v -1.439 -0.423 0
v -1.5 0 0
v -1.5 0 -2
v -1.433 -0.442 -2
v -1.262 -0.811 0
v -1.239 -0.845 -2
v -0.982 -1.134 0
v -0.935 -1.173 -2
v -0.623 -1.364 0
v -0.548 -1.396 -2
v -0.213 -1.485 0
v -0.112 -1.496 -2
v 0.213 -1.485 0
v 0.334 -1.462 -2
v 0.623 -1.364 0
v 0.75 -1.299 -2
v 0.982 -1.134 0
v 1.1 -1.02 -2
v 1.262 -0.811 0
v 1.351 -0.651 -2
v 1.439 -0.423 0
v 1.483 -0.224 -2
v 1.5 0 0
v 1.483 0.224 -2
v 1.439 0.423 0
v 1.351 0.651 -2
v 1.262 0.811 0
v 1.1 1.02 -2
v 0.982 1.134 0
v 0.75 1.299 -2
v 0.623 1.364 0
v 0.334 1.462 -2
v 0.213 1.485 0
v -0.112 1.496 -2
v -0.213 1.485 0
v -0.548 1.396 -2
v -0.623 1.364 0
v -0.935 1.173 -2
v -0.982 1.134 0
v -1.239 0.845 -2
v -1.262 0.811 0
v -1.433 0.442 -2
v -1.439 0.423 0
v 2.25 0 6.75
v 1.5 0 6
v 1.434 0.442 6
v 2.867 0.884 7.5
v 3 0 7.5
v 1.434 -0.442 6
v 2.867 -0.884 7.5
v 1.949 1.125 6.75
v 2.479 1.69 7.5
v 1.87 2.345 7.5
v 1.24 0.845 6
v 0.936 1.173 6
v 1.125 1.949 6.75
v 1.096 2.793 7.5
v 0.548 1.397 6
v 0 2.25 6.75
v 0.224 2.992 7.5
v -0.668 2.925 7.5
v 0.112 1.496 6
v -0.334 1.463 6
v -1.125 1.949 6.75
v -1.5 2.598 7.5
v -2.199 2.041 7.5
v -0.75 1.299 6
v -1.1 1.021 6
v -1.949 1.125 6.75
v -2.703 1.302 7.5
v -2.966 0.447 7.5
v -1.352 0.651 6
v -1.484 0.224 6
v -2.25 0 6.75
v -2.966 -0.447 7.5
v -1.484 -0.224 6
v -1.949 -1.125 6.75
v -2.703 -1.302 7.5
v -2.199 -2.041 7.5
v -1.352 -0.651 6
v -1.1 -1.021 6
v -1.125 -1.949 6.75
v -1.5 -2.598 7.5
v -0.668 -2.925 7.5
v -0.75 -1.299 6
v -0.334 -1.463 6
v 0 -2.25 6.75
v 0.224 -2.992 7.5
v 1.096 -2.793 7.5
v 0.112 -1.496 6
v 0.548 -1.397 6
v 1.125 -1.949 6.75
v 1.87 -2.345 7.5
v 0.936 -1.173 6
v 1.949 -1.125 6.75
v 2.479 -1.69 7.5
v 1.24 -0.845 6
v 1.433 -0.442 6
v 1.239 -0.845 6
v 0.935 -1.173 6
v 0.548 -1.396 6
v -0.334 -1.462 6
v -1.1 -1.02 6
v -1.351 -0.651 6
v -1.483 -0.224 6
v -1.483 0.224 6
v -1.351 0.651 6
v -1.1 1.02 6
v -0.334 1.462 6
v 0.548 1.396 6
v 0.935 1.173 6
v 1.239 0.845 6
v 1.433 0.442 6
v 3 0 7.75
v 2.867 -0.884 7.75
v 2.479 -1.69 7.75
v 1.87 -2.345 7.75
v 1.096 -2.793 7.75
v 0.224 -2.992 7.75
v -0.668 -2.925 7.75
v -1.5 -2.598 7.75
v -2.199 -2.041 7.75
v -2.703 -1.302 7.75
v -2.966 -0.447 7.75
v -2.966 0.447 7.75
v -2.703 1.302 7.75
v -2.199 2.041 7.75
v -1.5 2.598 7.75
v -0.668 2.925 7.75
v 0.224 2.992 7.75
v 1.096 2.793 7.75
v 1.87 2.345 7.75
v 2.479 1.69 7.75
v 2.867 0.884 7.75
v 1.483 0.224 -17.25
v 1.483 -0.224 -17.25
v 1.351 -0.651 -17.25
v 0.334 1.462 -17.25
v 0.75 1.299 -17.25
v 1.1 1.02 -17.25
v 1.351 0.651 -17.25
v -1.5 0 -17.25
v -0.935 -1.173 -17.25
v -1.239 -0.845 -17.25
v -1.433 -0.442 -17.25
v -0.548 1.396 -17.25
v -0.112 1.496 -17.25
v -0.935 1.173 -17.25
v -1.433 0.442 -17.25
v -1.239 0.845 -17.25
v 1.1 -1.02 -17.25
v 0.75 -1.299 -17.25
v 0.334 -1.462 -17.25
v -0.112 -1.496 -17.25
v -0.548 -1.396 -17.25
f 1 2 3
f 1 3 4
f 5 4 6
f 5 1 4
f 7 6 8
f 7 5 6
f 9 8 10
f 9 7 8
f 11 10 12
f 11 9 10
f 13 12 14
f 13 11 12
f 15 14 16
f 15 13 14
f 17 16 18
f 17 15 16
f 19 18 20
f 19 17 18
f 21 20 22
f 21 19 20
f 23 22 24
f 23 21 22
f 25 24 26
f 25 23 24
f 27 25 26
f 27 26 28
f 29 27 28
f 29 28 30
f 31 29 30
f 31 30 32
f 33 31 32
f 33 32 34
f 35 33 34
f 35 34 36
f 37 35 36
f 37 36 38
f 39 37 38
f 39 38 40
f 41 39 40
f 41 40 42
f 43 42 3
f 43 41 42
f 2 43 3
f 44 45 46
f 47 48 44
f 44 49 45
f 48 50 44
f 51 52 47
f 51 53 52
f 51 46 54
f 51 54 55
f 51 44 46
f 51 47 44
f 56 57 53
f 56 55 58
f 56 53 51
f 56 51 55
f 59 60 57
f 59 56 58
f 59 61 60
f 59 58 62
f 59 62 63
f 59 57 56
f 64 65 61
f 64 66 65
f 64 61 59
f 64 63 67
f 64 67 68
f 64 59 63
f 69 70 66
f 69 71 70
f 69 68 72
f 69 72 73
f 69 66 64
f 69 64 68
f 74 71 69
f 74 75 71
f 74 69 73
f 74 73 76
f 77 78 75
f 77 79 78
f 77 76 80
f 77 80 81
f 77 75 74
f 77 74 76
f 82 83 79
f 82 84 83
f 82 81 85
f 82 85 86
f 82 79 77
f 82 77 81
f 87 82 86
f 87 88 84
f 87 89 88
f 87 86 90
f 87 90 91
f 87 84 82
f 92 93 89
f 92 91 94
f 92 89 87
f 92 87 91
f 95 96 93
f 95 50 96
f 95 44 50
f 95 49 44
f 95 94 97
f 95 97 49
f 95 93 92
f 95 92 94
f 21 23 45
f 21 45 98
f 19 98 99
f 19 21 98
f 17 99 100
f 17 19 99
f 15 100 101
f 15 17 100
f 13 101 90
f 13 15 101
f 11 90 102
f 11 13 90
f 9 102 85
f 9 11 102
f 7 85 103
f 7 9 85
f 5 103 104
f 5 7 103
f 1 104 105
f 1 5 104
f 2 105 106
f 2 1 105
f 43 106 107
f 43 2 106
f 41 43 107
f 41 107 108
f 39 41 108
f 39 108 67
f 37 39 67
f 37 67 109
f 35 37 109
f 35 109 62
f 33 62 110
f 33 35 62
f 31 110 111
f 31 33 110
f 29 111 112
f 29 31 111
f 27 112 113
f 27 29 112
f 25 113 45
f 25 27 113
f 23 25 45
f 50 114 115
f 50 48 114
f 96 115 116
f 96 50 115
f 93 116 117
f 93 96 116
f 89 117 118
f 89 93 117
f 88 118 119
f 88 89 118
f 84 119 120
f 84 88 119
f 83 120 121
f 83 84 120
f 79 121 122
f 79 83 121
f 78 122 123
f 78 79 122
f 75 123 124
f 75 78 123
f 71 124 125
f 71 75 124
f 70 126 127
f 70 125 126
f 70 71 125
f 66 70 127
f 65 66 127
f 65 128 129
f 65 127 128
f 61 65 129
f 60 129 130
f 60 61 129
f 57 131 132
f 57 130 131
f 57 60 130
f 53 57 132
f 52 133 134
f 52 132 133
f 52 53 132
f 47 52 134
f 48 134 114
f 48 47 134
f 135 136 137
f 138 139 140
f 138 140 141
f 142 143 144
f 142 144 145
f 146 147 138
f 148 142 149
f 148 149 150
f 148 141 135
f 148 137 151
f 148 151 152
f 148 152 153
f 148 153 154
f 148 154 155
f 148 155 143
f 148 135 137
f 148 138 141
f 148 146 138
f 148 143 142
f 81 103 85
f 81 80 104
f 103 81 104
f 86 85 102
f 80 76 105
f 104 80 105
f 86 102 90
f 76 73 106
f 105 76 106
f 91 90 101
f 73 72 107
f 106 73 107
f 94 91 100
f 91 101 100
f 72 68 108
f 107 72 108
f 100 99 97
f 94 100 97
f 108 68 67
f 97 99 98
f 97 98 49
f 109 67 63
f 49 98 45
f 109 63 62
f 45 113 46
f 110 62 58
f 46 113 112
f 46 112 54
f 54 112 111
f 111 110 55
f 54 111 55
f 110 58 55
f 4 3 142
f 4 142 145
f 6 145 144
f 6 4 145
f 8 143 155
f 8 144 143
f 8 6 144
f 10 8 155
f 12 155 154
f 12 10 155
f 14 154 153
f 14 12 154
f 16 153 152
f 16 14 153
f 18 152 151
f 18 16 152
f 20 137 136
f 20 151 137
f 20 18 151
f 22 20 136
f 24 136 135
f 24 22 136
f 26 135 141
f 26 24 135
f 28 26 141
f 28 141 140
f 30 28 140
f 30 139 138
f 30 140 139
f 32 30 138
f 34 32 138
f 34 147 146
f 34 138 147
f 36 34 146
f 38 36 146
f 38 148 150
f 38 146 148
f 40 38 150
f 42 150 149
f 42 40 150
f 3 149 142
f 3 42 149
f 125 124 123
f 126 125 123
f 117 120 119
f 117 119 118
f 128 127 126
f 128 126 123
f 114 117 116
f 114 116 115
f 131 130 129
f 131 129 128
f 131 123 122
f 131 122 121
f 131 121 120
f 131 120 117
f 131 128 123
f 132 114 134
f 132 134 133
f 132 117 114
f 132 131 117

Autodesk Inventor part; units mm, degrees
ref_plane "YZ Plane" through (0, 0, 0) normal (1, 0, 0) x (0, 1, 0)
ref_plane "XZ Plane" through (0, 0, 0) normal (0, 1, 0) x (-1, 0, 0)
ref_plane "XY Plane" through (0, 0, 0) normal (0, 0, 1) x (1, 0, 0)
sketch "スケッチ1" plane through (0, 0, 0) normal (0, 0, 1) x (1, 0, 0)
  circle A0 centre (0, 0) radius 1.5
  dimension "d0" = 3
extrude "押し出し1" add sketch "スケッチ1" along normal blind 6
sketch "スケッチ2" plane through (0, 0, 6) normal (0, 0, 1) x (1, 0, 0)
  circle A0 centre (0, 0) radius 1.5 projected
  circle A1 centre (0, 0) radius 3
  dimension "d3" = 6
extrude "押し出し2" add sketch "スケッチ2" along normal blind 1.75 contours A0 | A1
thread "ねじ1" size "M3x0.5" class "6g" standard "ANSI Metric M Profile" full length
chamfer "面取り1" distance 1.5 angle 45 1 edges at (-3, 0, 6)
sketch "スケッチ4" plane through (0, 0, 0) normal (0, 0, -1) x (-1, 0, 0)
  circle A0 centre (0, 0) radius 1.5 projected
extrude "押し出し4" add sketch "スケッチ4" along normal blind 4
sketch "スケッチ5" plane through (0, 0, -4) normal (0, 0, -1) x (-1, 0, 0)
  circle A0 centre (0, 0) radius 1.5 projected
extrude "押し出し5" cut sketch "スケッチ5" against normal blind 2
sketch "スケッチ6" plane through (0, 0, -2) normal (0, 0, -1) x (-1, 0, 0)
  circle A0 centre (0, 0) radius 1.5 projected
extrude "押し出し6" add sketch "スケッチ6" along normal blind 15.25
properties part number "SB　25mm皿ネジ" material "Steel, Mild"
